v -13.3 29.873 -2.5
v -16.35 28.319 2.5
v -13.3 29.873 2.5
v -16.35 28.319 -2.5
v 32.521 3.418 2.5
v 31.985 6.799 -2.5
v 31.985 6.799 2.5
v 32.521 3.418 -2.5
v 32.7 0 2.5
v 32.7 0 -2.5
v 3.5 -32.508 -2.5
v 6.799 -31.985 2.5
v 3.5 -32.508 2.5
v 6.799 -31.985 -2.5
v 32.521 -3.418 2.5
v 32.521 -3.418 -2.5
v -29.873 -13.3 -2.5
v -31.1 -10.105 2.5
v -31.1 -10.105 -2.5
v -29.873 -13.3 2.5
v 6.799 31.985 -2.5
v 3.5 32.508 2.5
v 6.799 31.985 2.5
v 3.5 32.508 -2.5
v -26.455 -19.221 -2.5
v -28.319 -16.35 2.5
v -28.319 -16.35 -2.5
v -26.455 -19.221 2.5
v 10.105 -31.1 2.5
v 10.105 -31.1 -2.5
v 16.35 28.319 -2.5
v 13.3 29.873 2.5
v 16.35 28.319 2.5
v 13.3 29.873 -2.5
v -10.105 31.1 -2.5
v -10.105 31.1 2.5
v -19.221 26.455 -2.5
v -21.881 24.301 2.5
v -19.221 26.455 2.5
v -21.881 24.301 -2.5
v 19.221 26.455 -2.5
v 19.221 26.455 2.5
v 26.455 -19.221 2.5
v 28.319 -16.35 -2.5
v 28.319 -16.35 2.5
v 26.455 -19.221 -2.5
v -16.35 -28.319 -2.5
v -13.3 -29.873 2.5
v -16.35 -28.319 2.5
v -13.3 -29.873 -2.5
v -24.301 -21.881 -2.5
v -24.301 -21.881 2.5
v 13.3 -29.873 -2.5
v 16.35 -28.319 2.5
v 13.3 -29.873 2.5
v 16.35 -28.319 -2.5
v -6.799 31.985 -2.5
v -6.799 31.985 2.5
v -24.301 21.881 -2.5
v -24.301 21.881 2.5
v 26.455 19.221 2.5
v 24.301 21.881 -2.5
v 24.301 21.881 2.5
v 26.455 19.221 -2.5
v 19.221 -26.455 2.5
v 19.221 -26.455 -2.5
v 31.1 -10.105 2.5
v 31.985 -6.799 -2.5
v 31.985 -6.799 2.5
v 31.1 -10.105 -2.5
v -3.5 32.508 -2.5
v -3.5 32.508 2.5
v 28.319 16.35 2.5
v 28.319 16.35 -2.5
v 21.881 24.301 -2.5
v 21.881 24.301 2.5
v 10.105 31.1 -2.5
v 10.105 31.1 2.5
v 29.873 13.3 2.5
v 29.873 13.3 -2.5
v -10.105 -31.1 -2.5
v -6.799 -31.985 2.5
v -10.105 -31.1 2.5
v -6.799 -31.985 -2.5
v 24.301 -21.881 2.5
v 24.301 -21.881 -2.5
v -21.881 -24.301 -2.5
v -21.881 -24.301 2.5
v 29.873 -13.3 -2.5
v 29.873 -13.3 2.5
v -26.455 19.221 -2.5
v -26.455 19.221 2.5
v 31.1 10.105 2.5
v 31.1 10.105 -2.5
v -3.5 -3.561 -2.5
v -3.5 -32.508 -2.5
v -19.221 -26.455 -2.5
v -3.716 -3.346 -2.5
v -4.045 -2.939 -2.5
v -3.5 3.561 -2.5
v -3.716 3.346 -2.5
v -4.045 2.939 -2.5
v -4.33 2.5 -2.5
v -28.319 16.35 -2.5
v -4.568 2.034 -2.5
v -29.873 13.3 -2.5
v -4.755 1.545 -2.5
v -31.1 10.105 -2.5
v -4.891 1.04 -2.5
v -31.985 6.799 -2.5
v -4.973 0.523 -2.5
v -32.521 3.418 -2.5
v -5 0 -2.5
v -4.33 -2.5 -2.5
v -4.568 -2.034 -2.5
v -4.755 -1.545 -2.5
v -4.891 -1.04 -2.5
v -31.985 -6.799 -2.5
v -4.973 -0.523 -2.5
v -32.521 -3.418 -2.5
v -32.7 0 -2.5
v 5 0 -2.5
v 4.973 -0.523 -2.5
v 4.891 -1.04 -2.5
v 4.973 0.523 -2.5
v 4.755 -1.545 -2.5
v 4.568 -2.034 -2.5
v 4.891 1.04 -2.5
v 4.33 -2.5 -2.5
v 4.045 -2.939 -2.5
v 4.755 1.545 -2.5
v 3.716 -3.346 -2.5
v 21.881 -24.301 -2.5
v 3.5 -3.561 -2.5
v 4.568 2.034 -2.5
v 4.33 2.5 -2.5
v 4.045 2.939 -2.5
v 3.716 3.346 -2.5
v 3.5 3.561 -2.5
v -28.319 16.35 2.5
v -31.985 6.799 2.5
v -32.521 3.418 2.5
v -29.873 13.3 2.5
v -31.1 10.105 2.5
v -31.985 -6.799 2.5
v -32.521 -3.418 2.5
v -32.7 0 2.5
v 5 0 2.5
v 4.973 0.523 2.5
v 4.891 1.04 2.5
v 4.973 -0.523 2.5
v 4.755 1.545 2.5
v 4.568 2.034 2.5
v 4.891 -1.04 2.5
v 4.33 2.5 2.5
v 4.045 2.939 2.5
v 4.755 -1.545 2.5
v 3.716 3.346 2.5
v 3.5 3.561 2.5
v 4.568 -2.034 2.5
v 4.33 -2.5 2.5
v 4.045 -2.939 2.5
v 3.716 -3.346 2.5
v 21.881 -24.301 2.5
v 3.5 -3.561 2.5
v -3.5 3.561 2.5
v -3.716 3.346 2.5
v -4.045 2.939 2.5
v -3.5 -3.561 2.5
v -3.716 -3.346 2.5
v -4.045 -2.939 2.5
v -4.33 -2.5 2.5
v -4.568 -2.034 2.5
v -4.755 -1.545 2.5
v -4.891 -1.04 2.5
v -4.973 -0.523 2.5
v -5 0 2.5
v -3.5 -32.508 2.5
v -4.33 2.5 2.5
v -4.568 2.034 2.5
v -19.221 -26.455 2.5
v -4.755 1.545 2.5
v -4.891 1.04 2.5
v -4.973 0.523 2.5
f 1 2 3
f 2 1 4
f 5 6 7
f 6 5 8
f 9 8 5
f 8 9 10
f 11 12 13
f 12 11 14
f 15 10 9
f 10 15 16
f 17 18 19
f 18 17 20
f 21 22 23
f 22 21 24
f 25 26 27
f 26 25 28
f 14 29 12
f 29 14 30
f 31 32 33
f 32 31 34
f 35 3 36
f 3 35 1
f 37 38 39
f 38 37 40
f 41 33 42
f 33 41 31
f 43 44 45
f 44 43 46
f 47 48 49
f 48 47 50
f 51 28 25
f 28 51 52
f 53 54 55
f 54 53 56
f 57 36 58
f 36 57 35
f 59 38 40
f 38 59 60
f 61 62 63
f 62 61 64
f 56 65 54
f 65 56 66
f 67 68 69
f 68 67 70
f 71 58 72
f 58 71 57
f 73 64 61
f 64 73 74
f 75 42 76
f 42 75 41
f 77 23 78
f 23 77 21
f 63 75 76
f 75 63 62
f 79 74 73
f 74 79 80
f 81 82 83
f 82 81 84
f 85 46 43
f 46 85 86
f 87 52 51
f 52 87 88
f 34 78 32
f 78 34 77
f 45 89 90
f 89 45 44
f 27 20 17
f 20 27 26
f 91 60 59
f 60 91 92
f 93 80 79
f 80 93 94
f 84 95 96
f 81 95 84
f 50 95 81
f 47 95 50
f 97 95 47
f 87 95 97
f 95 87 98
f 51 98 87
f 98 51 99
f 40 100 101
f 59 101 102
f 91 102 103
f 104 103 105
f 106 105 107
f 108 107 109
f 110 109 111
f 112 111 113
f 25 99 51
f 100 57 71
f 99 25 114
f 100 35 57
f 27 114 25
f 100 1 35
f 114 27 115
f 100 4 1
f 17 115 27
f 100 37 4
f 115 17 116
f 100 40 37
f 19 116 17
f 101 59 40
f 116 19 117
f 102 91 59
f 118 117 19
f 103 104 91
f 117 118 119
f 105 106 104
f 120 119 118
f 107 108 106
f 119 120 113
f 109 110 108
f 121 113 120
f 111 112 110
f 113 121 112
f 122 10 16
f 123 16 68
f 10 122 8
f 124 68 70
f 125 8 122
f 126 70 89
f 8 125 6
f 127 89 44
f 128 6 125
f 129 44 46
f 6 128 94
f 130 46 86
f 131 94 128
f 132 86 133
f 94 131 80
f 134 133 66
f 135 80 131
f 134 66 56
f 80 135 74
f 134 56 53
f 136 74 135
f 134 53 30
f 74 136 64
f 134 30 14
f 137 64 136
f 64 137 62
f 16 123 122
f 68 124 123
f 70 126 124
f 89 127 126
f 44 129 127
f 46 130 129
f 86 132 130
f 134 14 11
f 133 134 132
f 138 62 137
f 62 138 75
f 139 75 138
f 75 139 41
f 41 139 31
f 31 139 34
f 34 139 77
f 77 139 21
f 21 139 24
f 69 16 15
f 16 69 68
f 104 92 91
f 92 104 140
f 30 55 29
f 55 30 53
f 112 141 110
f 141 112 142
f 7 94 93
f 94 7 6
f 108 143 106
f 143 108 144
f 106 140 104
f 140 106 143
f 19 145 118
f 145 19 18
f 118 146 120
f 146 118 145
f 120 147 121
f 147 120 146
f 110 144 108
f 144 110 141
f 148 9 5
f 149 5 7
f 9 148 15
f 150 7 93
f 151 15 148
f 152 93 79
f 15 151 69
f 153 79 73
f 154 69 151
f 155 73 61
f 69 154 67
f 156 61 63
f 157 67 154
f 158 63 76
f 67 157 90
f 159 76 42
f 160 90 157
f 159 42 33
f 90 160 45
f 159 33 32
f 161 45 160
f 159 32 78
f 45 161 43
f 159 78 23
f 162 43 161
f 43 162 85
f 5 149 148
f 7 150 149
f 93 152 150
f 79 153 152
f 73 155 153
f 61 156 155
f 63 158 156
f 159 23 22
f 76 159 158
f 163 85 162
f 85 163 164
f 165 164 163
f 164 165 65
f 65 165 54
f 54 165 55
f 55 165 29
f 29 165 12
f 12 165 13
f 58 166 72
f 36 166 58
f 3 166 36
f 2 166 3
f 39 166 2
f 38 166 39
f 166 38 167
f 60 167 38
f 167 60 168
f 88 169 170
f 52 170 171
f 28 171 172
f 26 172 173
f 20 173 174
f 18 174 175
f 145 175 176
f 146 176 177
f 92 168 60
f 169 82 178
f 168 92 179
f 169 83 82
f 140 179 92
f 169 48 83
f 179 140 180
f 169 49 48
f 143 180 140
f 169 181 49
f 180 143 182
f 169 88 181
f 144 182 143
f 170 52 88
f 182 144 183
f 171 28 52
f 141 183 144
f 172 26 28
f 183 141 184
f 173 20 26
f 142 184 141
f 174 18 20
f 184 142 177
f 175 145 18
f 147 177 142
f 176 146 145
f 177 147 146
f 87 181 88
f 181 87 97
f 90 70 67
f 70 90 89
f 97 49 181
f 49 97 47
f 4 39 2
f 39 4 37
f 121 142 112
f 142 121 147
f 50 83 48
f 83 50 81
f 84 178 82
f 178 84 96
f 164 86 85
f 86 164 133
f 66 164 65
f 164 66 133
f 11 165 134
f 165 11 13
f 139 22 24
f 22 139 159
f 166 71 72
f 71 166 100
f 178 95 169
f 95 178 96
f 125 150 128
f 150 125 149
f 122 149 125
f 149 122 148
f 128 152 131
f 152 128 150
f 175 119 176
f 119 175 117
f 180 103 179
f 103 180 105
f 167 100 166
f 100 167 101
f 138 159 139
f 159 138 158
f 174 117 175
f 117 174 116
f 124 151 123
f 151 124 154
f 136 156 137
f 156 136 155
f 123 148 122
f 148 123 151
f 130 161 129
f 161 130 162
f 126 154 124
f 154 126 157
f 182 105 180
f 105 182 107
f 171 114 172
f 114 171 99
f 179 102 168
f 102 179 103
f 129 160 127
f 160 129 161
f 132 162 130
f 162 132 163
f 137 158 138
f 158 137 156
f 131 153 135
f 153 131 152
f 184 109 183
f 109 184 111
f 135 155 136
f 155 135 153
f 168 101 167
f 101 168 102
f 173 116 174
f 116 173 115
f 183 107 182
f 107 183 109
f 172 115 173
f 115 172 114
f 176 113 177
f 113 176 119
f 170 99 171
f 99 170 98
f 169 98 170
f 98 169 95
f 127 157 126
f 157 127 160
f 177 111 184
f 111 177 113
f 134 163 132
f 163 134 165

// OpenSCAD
// original dimensions

$fn=60;

outer_lower_diameter = 68.0;  // mm

outer_upper_diameter = 69.5;  // mm
inner_upper_diameter = 66.0;  // mm

inner_rim_height     =  1.0;  // mm
inner_rim_width      =  1.5;  // mm

bottom_hole_diameter =  7.0;  // mm
bottom_cutout_width  =  4.0;  // mm

bottom_width         =  1.3;  // mm
wall_width           =  2.0;  // mm



height               =  5.0;  // mm


inner_lower_diameter = outer_lower_diameter - bottom_width * 2;
bottom_inset_cutout  = bottom_cutout_width  + inner_rim_width * 2;
bottom_inset_hole    = bottom_hole_diameter + inner_rim_width * 2;

difference() {
    cylinder(d=inner_lower_diameter, h=height, center=true);
        cube([bottom_inset_cutout, outer_lower_diameter, height+1], center=true);
        cylinder(d=bottom_inset_hole, h=height+1, center=true);
}
